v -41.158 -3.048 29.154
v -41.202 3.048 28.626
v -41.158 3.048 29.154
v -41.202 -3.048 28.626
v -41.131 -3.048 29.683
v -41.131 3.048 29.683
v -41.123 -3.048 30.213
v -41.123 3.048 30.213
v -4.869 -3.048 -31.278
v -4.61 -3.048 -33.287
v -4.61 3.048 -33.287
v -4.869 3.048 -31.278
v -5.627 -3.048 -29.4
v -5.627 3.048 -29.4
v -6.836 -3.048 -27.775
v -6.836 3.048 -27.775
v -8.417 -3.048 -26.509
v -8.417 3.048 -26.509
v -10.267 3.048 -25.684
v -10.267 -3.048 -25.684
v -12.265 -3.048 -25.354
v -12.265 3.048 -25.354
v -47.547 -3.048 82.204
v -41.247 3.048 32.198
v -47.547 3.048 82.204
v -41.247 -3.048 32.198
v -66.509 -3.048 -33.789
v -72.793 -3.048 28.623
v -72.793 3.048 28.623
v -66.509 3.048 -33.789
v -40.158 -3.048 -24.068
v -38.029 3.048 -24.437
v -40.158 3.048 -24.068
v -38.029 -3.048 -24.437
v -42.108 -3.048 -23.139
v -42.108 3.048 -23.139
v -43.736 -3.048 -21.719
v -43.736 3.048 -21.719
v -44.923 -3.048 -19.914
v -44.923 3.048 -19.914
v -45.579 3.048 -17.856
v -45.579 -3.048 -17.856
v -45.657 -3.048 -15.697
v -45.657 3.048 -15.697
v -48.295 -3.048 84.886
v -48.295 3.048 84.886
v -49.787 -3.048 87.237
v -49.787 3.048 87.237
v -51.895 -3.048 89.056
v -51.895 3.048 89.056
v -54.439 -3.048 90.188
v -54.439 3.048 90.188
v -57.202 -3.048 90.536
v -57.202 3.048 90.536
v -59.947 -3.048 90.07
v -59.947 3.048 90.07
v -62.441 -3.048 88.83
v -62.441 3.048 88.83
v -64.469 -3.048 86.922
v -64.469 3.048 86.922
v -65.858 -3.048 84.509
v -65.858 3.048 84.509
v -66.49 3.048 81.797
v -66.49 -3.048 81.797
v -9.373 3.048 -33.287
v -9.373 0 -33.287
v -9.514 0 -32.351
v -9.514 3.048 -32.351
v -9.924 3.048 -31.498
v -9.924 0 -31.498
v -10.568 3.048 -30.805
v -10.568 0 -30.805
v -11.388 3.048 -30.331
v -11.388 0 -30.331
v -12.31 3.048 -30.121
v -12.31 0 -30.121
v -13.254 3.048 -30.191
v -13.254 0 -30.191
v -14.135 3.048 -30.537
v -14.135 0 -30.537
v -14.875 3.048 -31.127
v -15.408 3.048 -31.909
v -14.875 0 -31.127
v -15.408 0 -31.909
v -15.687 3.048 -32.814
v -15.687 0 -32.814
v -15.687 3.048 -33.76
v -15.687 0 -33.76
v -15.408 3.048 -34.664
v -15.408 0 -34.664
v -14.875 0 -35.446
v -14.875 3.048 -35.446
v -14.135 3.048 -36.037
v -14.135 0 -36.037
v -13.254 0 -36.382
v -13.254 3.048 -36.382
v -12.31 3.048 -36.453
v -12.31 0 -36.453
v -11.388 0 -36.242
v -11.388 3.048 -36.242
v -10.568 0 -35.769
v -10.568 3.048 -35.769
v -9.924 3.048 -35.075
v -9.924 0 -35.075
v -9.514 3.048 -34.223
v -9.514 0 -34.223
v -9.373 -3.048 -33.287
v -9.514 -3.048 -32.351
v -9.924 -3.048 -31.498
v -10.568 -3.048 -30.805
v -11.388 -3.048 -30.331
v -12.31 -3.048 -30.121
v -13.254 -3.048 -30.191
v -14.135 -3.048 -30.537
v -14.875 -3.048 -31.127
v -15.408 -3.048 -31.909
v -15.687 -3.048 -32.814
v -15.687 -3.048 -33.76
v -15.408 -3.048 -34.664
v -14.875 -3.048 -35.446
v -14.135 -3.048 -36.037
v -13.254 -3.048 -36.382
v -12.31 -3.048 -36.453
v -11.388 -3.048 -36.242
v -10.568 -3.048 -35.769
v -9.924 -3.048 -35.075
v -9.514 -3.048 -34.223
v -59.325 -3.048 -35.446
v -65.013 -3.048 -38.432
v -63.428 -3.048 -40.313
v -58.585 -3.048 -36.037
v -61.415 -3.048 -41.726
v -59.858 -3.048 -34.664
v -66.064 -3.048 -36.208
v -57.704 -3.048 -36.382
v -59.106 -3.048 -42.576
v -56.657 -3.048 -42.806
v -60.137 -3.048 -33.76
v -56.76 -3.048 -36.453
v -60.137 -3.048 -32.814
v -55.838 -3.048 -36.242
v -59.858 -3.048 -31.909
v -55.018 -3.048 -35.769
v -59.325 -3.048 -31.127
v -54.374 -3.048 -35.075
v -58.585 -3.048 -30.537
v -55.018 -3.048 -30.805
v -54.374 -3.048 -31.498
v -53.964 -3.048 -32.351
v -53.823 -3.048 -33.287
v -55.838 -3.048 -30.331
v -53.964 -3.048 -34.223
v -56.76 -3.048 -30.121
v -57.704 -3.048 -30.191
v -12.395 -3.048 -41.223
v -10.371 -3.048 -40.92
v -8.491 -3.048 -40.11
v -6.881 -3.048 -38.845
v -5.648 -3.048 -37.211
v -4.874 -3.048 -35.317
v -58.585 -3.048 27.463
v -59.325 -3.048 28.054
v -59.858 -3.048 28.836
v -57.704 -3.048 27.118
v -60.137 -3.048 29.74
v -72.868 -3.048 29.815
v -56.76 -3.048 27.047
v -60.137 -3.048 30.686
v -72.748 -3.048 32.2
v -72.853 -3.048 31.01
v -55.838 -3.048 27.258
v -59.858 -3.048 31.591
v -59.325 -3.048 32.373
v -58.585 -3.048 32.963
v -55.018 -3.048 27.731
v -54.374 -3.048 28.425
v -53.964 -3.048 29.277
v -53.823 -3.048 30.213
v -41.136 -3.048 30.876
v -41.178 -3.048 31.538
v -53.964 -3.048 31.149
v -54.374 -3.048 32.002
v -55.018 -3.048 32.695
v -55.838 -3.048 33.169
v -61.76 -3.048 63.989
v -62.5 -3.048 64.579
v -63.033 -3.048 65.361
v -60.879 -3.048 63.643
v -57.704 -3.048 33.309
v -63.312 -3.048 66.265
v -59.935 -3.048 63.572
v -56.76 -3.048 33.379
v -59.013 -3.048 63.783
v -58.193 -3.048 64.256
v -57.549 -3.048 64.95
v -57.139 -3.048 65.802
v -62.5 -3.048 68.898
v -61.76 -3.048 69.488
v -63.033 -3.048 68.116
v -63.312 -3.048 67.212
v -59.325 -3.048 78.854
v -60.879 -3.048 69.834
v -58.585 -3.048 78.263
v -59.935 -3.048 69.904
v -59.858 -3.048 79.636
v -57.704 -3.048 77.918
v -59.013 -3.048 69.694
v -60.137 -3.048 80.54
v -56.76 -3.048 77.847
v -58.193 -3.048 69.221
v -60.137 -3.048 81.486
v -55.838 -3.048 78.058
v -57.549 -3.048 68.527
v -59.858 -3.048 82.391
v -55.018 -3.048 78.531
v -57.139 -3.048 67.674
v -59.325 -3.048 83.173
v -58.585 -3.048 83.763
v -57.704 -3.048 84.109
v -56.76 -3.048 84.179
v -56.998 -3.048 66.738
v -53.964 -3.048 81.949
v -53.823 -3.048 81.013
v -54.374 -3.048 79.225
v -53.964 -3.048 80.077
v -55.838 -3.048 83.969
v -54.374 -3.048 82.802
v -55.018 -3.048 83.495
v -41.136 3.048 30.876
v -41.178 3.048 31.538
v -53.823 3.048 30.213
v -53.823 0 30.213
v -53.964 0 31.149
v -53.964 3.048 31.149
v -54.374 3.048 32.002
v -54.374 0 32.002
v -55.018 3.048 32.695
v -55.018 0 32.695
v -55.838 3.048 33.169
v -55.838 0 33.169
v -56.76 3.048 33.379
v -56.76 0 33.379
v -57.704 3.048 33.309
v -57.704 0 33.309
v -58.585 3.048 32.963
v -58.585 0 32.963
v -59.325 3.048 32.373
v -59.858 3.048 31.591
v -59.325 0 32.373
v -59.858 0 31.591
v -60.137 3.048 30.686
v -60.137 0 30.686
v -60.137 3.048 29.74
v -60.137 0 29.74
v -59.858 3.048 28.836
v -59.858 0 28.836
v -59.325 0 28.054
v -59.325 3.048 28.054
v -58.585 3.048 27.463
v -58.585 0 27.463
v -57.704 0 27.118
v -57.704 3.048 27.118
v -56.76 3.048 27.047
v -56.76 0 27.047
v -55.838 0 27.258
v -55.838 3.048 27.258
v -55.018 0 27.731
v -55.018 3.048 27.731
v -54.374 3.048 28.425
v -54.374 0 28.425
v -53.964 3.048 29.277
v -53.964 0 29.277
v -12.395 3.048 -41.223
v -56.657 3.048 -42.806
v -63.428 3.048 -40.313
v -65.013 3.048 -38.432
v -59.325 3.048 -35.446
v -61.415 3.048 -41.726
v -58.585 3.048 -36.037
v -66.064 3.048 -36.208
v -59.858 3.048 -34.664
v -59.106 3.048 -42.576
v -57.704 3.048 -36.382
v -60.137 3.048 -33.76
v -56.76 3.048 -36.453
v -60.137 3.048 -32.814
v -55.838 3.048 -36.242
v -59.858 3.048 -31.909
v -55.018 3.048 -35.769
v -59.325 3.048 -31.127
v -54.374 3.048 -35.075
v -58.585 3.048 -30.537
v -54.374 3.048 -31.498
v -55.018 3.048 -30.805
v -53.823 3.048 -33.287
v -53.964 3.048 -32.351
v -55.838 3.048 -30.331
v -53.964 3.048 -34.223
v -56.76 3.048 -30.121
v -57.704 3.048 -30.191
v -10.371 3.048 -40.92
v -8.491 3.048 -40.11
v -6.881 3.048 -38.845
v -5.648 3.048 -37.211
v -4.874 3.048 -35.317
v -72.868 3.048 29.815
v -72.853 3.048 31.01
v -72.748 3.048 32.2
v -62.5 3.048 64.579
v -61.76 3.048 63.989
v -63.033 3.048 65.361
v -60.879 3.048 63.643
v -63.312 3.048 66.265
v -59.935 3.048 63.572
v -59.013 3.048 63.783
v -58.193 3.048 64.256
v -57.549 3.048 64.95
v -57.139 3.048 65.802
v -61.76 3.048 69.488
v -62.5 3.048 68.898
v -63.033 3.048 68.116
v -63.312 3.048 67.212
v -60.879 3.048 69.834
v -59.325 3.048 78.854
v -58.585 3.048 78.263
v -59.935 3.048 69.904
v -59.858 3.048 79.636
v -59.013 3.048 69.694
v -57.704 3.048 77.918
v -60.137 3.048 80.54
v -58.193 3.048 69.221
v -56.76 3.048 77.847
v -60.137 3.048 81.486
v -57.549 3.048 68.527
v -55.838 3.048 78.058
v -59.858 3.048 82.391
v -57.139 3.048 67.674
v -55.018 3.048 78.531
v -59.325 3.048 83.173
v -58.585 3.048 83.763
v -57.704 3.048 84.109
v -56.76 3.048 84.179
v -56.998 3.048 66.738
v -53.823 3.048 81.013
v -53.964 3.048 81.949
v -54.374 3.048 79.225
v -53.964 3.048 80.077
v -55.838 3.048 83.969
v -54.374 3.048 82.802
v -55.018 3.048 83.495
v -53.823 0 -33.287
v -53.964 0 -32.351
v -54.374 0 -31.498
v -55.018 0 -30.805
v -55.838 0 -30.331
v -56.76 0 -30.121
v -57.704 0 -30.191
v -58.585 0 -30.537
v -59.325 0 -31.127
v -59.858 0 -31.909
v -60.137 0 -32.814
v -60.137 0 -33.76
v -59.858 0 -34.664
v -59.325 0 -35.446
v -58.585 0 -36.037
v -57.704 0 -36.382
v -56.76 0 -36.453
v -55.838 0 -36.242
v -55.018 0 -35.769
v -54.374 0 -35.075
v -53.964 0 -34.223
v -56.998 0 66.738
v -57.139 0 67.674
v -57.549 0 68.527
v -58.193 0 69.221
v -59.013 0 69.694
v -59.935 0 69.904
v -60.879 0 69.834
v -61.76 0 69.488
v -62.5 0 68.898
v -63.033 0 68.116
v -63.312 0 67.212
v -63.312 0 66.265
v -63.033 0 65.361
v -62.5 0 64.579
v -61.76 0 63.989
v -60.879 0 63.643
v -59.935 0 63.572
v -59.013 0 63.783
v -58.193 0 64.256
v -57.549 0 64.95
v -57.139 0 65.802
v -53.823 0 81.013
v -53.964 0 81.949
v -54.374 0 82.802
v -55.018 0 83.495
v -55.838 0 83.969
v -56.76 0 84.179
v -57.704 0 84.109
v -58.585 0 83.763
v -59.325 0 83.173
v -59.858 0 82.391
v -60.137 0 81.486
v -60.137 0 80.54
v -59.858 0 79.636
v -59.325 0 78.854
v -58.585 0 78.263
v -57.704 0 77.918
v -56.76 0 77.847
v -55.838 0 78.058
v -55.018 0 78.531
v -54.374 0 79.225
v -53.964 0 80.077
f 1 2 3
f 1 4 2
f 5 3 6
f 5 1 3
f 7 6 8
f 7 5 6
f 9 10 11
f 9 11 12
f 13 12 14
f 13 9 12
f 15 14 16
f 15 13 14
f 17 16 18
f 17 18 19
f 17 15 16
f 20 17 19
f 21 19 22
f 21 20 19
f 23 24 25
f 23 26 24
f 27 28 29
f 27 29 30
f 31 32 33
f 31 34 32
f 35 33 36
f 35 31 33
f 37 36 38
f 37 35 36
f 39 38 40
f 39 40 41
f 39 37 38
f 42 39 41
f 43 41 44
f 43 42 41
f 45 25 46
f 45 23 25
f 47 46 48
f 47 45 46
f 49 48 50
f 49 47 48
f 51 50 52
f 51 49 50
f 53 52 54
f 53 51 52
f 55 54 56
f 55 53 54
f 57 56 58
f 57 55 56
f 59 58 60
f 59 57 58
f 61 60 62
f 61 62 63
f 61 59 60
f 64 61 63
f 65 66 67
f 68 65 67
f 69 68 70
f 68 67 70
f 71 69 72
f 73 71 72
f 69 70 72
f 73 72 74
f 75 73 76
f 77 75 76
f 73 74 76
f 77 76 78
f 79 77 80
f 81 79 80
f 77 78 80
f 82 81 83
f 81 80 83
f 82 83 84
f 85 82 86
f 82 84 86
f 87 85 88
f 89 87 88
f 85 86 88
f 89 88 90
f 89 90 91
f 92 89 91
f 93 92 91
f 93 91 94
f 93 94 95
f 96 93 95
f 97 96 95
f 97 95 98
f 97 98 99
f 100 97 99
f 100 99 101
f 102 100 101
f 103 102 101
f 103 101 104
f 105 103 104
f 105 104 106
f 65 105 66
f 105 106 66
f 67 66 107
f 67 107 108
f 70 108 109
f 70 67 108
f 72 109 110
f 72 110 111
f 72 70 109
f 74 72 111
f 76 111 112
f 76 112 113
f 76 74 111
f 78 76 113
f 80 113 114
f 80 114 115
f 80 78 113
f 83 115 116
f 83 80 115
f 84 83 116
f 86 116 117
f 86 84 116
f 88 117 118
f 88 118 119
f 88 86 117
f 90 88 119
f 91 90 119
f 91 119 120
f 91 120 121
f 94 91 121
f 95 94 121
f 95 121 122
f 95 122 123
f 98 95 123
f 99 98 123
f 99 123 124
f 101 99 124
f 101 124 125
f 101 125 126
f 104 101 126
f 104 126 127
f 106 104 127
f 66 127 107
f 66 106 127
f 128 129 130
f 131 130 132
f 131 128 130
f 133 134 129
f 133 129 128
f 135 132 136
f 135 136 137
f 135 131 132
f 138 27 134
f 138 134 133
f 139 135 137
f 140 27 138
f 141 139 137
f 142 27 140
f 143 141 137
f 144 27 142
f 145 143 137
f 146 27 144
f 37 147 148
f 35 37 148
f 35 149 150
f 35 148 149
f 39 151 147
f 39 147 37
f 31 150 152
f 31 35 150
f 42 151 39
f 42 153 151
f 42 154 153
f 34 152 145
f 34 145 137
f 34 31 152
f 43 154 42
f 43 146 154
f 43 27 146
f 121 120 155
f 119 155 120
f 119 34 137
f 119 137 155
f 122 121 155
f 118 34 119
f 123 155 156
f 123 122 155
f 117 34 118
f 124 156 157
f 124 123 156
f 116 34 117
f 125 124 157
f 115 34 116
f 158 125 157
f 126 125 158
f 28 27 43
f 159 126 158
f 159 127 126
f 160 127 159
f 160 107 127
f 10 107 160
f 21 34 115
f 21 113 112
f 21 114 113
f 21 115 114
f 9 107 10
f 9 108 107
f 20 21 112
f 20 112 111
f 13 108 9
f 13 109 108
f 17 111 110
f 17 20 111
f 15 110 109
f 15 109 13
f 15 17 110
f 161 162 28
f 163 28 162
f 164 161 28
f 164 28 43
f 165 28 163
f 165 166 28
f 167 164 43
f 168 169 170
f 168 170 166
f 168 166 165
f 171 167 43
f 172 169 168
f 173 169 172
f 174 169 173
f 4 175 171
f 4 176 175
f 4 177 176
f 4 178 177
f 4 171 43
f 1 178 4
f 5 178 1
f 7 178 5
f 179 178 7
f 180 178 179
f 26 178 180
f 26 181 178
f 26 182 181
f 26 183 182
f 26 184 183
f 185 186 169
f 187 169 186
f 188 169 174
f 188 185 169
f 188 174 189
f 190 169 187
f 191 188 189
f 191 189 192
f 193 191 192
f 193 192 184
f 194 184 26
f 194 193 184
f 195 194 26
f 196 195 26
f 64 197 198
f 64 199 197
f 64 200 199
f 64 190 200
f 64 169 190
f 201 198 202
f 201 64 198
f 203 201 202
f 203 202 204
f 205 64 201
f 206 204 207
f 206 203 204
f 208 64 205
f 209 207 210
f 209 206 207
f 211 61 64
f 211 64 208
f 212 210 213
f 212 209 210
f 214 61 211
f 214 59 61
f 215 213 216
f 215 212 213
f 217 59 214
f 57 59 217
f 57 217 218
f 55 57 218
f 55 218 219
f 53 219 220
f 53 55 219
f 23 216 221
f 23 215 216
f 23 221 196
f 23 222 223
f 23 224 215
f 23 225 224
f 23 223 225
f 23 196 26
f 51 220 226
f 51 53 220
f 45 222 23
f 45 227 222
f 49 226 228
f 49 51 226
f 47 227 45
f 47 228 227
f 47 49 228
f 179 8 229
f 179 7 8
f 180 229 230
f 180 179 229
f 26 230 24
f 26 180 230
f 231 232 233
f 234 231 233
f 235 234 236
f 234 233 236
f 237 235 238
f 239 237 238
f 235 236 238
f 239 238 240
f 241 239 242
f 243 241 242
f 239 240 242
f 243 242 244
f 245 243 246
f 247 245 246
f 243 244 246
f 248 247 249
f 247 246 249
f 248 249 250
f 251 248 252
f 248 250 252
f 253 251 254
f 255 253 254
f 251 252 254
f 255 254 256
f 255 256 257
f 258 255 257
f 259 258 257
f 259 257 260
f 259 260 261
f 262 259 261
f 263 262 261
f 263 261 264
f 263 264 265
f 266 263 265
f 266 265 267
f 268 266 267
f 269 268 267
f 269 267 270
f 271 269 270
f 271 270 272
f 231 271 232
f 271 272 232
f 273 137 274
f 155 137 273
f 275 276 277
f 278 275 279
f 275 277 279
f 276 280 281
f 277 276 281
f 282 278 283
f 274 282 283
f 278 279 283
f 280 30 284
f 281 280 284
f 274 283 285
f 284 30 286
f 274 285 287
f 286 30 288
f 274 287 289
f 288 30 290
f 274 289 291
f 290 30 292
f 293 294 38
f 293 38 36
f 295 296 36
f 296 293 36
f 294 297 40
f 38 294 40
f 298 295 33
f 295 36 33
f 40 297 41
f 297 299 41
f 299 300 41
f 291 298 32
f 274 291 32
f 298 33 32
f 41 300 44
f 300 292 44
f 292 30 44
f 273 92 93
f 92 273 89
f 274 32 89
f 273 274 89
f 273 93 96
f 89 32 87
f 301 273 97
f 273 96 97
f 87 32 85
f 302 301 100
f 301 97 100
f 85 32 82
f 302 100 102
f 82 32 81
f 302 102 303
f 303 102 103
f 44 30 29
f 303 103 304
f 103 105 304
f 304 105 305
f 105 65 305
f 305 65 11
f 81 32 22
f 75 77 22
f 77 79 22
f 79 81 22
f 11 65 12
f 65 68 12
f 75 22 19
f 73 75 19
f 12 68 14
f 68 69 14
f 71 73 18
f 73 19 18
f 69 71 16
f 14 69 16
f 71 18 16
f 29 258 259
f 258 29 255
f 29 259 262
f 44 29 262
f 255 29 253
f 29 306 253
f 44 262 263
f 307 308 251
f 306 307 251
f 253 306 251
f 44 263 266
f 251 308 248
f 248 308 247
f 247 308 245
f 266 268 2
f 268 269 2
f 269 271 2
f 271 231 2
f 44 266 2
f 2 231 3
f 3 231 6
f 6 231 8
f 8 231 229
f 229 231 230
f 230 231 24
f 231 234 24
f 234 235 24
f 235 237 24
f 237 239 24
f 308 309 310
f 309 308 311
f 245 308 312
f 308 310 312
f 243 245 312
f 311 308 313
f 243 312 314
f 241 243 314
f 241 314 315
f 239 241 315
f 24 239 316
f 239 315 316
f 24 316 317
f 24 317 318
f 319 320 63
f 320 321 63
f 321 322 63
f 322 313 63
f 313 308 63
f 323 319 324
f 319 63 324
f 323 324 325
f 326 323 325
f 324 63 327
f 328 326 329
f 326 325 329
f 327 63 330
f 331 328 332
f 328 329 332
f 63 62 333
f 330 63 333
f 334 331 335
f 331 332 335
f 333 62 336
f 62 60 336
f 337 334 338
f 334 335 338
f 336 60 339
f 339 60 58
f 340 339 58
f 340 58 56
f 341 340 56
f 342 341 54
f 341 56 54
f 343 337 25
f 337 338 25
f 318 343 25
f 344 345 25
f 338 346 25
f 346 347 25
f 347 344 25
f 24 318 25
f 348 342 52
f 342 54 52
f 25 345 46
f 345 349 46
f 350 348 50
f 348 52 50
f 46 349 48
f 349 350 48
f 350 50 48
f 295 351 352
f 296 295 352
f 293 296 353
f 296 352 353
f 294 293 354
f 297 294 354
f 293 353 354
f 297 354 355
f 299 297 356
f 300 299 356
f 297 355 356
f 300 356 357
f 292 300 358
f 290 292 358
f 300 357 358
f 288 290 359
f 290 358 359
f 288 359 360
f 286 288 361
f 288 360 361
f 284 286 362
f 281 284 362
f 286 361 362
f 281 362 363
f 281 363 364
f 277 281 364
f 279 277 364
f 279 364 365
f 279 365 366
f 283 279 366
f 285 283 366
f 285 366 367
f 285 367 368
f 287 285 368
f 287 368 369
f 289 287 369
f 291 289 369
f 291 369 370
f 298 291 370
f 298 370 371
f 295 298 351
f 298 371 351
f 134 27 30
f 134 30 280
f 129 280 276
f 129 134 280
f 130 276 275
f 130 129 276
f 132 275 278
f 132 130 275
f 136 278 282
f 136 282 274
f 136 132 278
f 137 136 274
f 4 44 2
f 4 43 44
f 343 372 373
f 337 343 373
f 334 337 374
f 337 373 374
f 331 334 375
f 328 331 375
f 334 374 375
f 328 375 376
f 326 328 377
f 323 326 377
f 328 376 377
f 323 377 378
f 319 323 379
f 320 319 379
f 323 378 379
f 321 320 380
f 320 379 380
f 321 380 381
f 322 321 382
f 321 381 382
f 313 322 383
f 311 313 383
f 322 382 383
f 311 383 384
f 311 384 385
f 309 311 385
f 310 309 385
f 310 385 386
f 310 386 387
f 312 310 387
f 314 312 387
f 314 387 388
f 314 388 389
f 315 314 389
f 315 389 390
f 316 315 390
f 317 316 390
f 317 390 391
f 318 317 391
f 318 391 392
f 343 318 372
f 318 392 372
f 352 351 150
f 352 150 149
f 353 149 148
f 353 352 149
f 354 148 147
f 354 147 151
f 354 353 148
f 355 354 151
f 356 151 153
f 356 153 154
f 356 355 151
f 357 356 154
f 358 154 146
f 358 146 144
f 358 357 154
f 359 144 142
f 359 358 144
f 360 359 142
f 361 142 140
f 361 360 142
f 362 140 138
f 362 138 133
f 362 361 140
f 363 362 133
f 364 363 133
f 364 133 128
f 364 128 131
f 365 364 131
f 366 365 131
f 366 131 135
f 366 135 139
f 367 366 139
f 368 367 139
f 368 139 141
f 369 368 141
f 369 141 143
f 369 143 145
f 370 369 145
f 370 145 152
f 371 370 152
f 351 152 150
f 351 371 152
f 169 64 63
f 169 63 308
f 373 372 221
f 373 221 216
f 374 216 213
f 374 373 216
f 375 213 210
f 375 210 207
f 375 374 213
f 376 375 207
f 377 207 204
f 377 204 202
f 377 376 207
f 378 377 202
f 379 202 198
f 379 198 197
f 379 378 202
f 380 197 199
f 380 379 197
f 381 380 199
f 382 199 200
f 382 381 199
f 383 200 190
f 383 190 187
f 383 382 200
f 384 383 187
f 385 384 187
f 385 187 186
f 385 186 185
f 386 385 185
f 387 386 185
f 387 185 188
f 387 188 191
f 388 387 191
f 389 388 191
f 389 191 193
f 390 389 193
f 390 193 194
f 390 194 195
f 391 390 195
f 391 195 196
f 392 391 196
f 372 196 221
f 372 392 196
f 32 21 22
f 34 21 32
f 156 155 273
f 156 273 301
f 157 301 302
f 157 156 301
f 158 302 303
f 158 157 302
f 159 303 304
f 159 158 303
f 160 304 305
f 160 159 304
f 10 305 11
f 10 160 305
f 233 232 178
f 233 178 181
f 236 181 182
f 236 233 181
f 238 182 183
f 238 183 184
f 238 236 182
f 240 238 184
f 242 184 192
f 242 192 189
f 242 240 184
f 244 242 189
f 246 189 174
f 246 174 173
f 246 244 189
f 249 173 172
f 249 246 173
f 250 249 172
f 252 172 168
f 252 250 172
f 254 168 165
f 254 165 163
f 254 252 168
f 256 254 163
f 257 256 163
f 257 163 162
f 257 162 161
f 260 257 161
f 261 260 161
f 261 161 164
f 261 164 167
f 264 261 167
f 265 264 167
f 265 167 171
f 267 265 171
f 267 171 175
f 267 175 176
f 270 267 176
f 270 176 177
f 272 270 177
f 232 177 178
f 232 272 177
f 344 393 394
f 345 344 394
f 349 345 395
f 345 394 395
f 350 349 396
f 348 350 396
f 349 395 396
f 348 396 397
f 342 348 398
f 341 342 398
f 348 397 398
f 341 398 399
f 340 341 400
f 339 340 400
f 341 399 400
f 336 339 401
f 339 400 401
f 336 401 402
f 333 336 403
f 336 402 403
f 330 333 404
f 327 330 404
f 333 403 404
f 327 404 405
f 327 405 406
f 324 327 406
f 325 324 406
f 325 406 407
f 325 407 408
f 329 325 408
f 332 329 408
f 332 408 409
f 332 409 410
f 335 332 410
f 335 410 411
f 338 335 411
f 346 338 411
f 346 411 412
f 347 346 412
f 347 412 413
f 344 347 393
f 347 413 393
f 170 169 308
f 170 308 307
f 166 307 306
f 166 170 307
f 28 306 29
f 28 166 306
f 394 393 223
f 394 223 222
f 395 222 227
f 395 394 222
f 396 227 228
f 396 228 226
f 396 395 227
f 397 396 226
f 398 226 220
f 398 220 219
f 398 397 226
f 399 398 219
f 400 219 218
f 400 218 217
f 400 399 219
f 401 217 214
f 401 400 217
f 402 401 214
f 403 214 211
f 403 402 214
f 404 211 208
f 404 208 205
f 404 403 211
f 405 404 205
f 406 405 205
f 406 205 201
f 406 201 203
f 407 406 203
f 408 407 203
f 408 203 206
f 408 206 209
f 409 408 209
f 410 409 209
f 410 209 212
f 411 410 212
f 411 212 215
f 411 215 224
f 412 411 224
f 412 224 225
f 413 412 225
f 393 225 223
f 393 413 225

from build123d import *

# Parameters (mm, degrees)
F0_R          = 3.175
F1_DEPTH      = 3.048
F1_DEPTH_BACK = 3.048


with BuildPart() as f1:
    # F0 (on Front) → F1 (new body, two sides)
    with BuildSketch(Plane.XZ) as f1_sk:
        with BuildLine():
            ThreePointArc((-66.490328, 81.796864), (-57.389826, 71.496208), (-47.472626, 81.01313))
            ThreePointArc((-47.472626, 81.01313), (-47.491321, 81.609613), (-47.547333, 82.203755))
            ThreePointArc((-47.547333, 82.203755), (-57.202173, 90.535933), (-66.490328, 81.796864))
        make_face()
        with Locations((-56.997626, 81.01313)):
            Circle(F0_R, mode=Mode.SUBTRACT)
        with BuildLine():
            ThreePointArc((-47.547333, 82.203755), (-47.491321, 81.609613), (-47.472626, 81.01313))
            ThreePointArc((-47.472626, 81.01313), (-57.389826, 71.496208), (-66.490328, 81.796864))
            Line((-66.490328, 81.796864), (-72.747765, 32.200273))
            ThreePointArc((-72.747765, 32.200273), (-56.996231, 46.08813), (-41.247138, 32.197505))
            Line((-41.247138, 32.197505), (-47.547333, 82.203755))
        make_face()
        with Locations((-60.172626, 66.73833)):
            Circle(F0_R, mode=Mode.SUBTRACT)
        with BuildLine():
            ThreePointArc((-41.122626, 30.21313), (-41.153785, 31.207269), (-41.247138, 32.197505))
            ThreePointArc((-41.247138, 32.197505), (-56.996231, 46.08813), (-72.747765, 32.200273))
            ThreePointArc((-72.747765, 32.200273), (-72.871369, 30.412875), (-72.79278, 28.622934))
            ThreePointArc((-72.79278, 28.622934), (-56.996271, 14.33813), (-41.202201, 28.62563))
            ThreePointArc((-41.202201, 28.62563), (-41.142532, 29.418383), (-41.122626, 30.21313))
        make_face()
        with Locations((-56.997626, 30.21313)):
            Circle(F0_R, mode=Mode.SUBTRACT)
        with BuildLine():
            ThreePointArc((-41.202201, 28.62563), (-56.996271, 14.33813), (-72.79278, 28.622934))
            Line((-72.79278, 28.622934), (-66.509378, -33.78907))
            ThreePointArc((-66.509378, -33.78907), (-57.248813, -23.765183), (-47.472626, -33.28687))
            ThreePointArc((-47.472626, -33.28687), (-50.143137, -39.900614), (-56.657215, -42.805785))
            Line((-56.657215, -42.805785), (-12.395022, -41.222903))
            ThreePointArc((-12.395022, -41.222903), (-20.484861, -33.221945), (-12.265221, -25.354396))
            Line((-12.265221, -25.354396), (-38.029298, -24.437165))
            ThreePointArc((-38.029298, -24.437165), (-43.736422, -21.719407), (-45.65679, -15.696978))
            Line((-45.65679, -15.696978), (-41.202201, 28.62563))
        make_face()
        with BuildLine():
            ThreePointArc((-47.472626, -33.28687), (-57.248813, -23.765183), (-66.509378, -33.78907))
            ThreePointArc((-66.509378, -33.78907), (-63.428308, -40.313389), (-56.657215, -42.805785))
            ThreePointArc((-56.657215, -42.805785), (-50.143137, -39.900614), (-47.472626, -33.28687))
        make_face()
        with Locations((-56.997626, -33.28687)):
            Circle(F0_R, mode=Mode.SUBTRACT)
        with BuildLine():
            ThreePointArc((-12.265221, -25.354396), (-20.484861, -33.221945), (-12.395022, -41.222903))
            ThreePointArc((-12.395022, -41.222903), (-6.881269, -38.845315), (-4.610126, -33.28687))
            ThreePointArc((-4.610126, -33.28687), (-6.835993, -27.77496), (-12.265221, -25.354396))
        make_face()
        with Locations((-12.547626, -33.28687)):
            Circle(F0_R, mode=Mode.SUBTRACT)
    extrude(amount=F1_DEPTH)
    extrude(f1_sk.sketch, amount=-F1_DEPTH_BACK)


solid = f1.part
